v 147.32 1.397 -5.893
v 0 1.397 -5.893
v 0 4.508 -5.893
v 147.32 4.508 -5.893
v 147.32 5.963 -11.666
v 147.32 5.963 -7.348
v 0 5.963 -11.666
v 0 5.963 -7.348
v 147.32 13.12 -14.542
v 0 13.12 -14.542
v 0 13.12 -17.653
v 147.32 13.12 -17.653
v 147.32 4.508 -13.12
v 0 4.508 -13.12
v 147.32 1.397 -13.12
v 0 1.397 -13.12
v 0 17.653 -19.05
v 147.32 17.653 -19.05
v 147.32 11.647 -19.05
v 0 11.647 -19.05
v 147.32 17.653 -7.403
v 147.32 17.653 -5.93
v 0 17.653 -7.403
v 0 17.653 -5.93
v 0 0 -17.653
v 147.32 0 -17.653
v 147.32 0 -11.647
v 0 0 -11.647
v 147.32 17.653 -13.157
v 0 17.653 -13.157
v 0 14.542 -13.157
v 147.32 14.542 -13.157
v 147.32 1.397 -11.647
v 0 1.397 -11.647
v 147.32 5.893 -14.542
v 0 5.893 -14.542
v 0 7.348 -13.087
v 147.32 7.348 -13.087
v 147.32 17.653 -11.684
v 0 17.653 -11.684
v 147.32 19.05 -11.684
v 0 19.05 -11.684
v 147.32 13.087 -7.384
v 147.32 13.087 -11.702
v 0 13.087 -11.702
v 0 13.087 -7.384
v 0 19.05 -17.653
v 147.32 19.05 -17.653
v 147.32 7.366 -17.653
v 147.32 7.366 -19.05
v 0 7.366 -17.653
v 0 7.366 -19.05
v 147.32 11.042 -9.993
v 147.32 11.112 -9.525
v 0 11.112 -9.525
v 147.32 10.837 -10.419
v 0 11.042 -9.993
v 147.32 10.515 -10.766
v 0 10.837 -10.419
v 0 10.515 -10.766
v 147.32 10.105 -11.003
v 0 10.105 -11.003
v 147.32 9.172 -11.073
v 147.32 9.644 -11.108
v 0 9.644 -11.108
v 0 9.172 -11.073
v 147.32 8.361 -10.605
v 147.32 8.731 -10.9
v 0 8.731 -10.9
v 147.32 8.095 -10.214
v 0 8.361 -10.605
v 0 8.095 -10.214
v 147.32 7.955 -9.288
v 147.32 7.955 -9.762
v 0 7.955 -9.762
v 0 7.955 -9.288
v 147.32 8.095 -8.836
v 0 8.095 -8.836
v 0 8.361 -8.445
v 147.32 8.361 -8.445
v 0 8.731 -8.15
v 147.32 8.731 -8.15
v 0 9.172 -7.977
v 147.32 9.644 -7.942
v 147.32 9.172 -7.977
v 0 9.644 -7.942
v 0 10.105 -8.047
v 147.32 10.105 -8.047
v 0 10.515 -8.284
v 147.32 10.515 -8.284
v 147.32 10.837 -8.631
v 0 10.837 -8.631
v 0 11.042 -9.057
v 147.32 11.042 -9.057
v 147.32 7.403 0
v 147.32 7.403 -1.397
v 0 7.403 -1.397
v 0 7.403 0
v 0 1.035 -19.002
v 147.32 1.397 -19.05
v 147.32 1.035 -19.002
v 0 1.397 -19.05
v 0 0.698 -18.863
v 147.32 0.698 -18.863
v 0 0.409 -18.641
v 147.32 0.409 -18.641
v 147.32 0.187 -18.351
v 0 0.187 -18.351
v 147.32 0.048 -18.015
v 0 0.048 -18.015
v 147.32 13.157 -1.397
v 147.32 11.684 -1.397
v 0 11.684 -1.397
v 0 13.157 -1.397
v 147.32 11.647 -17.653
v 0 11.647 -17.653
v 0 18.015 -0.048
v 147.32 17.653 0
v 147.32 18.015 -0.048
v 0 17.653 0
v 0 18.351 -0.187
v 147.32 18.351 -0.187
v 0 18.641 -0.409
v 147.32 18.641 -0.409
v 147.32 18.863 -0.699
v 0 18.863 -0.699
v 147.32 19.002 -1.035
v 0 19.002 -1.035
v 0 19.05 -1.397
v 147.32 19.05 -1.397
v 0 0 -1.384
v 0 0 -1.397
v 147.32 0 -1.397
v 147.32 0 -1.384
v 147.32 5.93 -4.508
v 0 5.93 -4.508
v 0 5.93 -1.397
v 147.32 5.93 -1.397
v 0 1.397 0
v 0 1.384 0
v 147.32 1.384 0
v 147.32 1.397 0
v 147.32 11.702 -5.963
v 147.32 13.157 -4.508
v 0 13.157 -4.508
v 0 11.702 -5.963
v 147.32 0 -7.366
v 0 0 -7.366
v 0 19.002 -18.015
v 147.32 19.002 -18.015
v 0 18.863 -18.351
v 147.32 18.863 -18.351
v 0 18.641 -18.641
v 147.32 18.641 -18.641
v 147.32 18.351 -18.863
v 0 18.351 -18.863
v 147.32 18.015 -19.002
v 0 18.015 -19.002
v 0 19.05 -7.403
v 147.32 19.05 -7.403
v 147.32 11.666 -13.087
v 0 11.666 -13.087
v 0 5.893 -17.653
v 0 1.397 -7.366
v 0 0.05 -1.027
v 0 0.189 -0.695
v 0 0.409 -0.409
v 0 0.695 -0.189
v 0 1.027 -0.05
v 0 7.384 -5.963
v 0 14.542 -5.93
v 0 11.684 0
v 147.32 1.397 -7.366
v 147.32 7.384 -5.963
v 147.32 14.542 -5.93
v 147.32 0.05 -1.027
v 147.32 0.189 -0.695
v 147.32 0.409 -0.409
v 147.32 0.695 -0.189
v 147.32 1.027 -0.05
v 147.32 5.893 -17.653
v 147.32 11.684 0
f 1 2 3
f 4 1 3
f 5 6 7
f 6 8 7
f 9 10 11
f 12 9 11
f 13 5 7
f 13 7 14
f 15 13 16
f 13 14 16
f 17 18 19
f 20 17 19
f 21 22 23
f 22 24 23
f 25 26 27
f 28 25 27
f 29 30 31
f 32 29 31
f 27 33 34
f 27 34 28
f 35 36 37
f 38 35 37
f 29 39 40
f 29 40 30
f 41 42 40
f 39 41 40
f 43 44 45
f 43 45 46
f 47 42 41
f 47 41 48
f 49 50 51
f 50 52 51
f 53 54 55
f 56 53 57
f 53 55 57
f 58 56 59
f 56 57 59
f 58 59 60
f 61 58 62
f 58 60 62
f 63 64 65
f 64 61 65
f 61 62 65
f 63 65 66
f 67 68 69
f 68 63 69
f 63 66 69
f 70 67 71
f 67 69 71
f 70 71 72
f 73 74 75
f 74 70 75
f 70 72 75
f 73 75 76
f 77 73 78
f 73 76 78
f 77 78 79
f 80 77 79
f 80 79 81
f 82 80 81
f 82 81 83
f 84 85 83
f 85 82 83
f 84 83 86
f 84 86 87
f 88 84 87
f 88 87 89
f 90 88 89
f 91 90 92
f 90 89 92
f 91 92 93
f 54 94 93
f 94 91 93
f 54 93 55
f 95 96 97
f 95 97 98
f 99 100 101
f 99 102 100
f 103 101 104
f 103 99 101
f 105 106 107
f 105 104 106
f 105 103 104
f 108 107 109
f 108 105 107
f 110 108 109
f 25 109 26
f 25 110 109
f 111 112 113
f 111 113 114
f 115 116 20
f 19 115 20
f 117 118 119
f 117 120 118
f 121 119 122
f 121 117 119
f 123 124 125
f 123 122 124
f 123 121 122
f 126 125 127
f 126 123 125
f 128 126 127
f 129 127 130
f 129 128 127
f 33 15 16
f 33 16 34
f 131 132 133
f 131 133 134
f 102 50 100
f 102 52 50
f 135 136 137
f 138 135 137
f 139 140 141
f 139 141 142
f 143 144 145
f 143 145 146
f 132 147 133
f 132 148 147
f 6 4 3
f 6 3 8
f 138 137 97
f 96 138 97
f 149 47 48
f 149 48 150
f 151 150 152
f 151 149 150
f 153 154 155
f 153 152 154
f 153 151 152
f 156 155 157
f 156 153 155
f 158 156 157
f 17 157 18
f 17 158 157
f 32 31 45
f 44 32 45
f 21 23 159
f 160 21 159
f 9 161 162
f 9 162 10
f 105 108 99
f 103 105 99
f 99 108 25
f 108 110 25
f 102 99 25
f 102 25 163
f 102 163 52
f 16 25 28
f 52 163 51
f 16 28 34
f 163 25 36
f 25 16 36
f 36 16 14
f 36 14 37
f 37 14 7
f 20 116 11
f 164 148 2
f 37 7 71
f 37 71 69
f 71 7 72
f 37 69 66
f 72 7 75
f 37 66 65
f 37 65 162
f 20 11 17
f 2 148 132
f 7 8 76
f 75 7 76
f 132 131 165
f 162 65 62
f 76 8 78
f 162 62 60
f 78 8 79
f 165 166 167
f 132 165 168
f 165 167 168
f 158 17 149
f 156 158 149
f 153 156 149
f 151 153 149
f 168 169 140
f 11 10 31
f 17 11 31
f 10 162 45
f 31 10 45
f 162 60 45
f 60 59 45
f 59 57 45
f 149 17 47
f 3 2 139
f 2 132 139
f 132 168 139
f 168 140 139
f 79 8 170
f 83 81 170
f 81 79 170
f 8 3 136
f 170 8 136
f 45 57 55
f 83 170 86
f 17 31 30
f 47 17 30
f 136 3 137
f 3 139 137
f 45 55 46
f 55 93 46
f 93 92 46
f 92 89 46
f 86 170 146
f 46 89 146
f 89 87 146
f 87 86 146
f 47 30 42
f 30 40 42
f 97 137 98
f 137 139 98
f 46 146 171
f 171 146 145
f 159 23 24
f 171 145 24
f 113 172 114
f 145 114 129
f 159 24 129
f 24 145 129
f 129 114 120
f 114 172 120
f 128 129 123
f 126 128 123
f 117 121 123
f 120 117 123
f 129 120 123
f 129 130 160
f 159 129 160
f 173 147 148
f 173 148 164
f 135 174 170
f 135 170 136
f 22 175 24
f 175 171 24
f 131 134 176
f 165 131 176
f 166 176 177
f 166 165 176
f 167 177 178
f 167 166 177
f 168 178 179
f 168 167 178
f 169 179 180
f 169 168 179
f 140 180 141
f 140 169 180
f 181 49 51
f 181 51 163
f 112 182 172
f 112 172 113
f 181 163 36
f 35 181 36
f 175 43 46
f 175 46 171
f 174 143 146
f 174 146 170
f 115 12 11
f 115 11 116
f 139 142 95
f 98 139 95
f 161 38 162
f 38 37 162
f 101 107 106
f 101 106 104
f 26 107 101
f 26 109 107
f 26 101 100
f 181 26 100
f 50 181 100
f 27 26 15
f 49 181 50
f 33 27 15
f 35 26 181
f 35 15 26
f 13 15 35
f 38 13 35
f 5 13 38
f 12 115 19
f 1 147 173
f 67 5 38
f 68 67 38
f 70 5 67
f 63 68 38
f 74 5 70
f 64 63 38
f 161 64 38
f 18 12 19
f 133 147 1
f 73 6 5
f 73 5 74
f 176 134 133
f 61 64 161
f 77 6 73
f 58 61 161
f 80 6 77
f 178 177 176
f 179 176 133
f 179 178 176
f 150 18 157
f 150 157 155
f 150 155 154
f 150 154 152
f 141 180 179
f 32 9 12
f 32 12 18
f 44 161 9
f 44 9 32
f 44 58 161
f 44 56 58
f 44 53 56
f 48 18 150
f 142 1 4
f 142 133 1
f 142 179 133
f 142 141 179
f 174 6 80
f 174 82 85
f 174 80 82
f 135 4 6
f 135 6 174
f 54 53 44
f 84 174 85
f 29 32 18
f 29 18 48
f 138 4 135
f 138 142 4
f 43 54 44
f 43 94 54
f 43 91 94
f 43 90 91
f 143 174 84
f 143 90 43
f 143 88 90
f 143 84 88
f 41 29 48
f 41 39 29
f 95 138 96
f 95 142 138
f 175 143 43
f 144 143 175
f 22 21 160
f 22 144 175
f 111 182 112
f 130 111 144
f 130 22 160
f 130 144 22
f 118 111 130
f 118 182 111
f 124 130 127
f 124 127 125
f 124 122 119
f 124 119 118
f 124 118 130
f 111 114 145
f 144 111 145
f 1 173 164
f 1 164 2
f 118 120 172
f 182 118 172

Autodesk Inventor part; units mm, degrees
ref_plane "YZ Plane" through (0, 0, 0) normal (1, 0, 0) x (0, 1, 0)
ref_plane "XZ Plane" through (0, 0, 0) normal (0, 1, 0) x (-1, 0, 0)
ref_plane "XY Plane" through (0, 0, 0) normal (0, 0, 1) x (1, 0, 0)
sketch "Sketch2" plane through (0, 0, 0) normal (1, 0, 0) x (0, 1, 0)
  line L0 (1.3843, 0) -> (1.397, 0)
  line L1 (17.653, 0) -> (11.684, 0)
  line L2 (11.684, 0) -> (11.684, -1.397)
  line L3 (11.684, -1.397) -> (13.1572, -1.397)
  line L4 (13.1572, -1.397) -> (13.1572, -4.5085)
  line L5 (13.1572, -4.5085) -> (11.7024, -5.9633)
  line L6 (11.7024, -5.9633) -> (7.3844, -5.9633)
  line L7 (7.3844, -5.9633) -> (5.9296, -4.5085)
  line L8 (5.9296, -4.5085) -> (5.9296, -1.397)
  line L9 (5.9296, -1.397) -> (7.4028, -1.397)
  line L10 (7.4028, -1.397) -> (7.4028, 0)
  line L11 (1.397, 0) -> (7.4028, 0)
  line L12 (11.684, 0) -> (19.05, 0)
  line L13 (5.9633, -7.3476) -> (5.9633, -11.6656)
  line L14 (4.5085, -5.8928) -> (5.9633, -7.3476)
  line L15 (5.9633, -11.6656) -> (4.5085, -13.1204)
  line L16 (1.397, -13.1204) -> (1.397, -11.6472)
  line L17 (4.5085, -13.1204) -> (1.397, -13.1204)
  line L18 (1.397, -11.6472) -> (0, -11.6472)
  line L19 (1.397, -5.8928) -> (4.5085, -5.8928)
  line L20 (0, -7.366) -> (1.397, -7.366)
  line L21 (1.397, -7.366) -> (1.397, -5.8928)
  line L22 (7.3476, -13.0867) -> (11.6656, -13.0867)
  line L23 (5.8928, -14.5415) -> (7.3476, -13.0867)
  line L24 (11.6656, -13.0867) -> (13.1204, -14.5415)
  line L25 (13.1204, -17.653) -> (11.6472, -17.653)
  line L26 (13.1204, -14.5415) -> (13.1204, -17.653)
  line L27 (11.6472, -17.653) -> (11.6472, -19.05)
  line L28 (5.8928, -17.653) -> (5.8928, -14.5415)
  line L29 (7.366, -19.05) -> (7.366, -17.653)
  line L30 (7.366, -17.653) -> (5.8928, -17.653)
  line L31 (13.0867, -11.7024) -> (13.0867, -7.3844)
  line L32 (14.5415, -13.1572) -> (13.0867, -11.7024)
  line L33 (13.0867, -7.3844) -> (14.5415, -5.9296)
  line L34 (17.653, -5.9296) -> (17.653, -7.4028)
  line L35 (14.5415, -5.9296) -> (17.653, -5.9296)
  line L36 (17.653, -7.4028) -> (19.05, -7.4028)
  line L37 (17.653, -13.1572) -> (14.5415, -13.1572)
  line L38 (19.05, -11.684) -> (17.653, -11.684)
  line L39 (17.653, -11.684) -> (17.653, -13.1572)
  line L40 (1.3843, 0) -> (1.397, 0)
  line L41 (19.05, -1.397) -> (19.05, -7.4028)
  line L42 (19.05, -11.684) -> (19.05, -17.653)
  line L43 (17.653, -19.05) -> (11.6472, -19.05)
  line L44 (7.366, -19.05) -> (1.397, -19.05)
  line L45 (0, -17.653) -> (0, -11.6472)
  line L46 (0, -7.366) -> (0, -1.397)
  line L47 (0, -7.366) -> (0, -1.397)
  circle A0 centre (9.525, -9.525) radius 1.5875
  line L48 (1.3843, 0) -> (1.397, 0)
  line L49 (0, -1.397) -> (0, -1.3843)
  arc A1 (1.397, 0) -> (0, -1.397) centre (1.397, -1.397) ccw
  arc A2 (0, -17.653) -> (1.397, -19.05) centre (1.397, -17.653) ccw
  arc A3 (17.653, -19.05) -> (19.05, -17.653) centre (17.653, -17.653) ccw
  arc A4 (19.05, -1.397) -> (17.653, 0) centre (17.653, -1.397) ccw
  point P0 (0, 0)
  dimension "d34" = 7.366
  dimension "d35" = 1.397
  dimension "d37" = 1.4732
  dimension "d38" = 3.1115
  dimension "d39" = 2.0574
  dimension "d40" = 135
  dimension "d41" = 4.318
  dimension "d42" = 2.0574
  dimension "d43" = 1.4732
  dimension "d46" = 1.397
  dimension "d49" = 360
  dimension "d56" = 19.05
  dimension "d58" = 3.175
  dimension "d61" = 1.397
  dimension "d62" = 1.397
  dimension "d63" = 1.397
  dimension "d64" = 1.397
  dimension "d67" = 360
  dimension "d71" = 3.1115
extrude "Extrusion1" add sketch "Sketch2" along normal blind 147.32
properties part number "Extrusion"
